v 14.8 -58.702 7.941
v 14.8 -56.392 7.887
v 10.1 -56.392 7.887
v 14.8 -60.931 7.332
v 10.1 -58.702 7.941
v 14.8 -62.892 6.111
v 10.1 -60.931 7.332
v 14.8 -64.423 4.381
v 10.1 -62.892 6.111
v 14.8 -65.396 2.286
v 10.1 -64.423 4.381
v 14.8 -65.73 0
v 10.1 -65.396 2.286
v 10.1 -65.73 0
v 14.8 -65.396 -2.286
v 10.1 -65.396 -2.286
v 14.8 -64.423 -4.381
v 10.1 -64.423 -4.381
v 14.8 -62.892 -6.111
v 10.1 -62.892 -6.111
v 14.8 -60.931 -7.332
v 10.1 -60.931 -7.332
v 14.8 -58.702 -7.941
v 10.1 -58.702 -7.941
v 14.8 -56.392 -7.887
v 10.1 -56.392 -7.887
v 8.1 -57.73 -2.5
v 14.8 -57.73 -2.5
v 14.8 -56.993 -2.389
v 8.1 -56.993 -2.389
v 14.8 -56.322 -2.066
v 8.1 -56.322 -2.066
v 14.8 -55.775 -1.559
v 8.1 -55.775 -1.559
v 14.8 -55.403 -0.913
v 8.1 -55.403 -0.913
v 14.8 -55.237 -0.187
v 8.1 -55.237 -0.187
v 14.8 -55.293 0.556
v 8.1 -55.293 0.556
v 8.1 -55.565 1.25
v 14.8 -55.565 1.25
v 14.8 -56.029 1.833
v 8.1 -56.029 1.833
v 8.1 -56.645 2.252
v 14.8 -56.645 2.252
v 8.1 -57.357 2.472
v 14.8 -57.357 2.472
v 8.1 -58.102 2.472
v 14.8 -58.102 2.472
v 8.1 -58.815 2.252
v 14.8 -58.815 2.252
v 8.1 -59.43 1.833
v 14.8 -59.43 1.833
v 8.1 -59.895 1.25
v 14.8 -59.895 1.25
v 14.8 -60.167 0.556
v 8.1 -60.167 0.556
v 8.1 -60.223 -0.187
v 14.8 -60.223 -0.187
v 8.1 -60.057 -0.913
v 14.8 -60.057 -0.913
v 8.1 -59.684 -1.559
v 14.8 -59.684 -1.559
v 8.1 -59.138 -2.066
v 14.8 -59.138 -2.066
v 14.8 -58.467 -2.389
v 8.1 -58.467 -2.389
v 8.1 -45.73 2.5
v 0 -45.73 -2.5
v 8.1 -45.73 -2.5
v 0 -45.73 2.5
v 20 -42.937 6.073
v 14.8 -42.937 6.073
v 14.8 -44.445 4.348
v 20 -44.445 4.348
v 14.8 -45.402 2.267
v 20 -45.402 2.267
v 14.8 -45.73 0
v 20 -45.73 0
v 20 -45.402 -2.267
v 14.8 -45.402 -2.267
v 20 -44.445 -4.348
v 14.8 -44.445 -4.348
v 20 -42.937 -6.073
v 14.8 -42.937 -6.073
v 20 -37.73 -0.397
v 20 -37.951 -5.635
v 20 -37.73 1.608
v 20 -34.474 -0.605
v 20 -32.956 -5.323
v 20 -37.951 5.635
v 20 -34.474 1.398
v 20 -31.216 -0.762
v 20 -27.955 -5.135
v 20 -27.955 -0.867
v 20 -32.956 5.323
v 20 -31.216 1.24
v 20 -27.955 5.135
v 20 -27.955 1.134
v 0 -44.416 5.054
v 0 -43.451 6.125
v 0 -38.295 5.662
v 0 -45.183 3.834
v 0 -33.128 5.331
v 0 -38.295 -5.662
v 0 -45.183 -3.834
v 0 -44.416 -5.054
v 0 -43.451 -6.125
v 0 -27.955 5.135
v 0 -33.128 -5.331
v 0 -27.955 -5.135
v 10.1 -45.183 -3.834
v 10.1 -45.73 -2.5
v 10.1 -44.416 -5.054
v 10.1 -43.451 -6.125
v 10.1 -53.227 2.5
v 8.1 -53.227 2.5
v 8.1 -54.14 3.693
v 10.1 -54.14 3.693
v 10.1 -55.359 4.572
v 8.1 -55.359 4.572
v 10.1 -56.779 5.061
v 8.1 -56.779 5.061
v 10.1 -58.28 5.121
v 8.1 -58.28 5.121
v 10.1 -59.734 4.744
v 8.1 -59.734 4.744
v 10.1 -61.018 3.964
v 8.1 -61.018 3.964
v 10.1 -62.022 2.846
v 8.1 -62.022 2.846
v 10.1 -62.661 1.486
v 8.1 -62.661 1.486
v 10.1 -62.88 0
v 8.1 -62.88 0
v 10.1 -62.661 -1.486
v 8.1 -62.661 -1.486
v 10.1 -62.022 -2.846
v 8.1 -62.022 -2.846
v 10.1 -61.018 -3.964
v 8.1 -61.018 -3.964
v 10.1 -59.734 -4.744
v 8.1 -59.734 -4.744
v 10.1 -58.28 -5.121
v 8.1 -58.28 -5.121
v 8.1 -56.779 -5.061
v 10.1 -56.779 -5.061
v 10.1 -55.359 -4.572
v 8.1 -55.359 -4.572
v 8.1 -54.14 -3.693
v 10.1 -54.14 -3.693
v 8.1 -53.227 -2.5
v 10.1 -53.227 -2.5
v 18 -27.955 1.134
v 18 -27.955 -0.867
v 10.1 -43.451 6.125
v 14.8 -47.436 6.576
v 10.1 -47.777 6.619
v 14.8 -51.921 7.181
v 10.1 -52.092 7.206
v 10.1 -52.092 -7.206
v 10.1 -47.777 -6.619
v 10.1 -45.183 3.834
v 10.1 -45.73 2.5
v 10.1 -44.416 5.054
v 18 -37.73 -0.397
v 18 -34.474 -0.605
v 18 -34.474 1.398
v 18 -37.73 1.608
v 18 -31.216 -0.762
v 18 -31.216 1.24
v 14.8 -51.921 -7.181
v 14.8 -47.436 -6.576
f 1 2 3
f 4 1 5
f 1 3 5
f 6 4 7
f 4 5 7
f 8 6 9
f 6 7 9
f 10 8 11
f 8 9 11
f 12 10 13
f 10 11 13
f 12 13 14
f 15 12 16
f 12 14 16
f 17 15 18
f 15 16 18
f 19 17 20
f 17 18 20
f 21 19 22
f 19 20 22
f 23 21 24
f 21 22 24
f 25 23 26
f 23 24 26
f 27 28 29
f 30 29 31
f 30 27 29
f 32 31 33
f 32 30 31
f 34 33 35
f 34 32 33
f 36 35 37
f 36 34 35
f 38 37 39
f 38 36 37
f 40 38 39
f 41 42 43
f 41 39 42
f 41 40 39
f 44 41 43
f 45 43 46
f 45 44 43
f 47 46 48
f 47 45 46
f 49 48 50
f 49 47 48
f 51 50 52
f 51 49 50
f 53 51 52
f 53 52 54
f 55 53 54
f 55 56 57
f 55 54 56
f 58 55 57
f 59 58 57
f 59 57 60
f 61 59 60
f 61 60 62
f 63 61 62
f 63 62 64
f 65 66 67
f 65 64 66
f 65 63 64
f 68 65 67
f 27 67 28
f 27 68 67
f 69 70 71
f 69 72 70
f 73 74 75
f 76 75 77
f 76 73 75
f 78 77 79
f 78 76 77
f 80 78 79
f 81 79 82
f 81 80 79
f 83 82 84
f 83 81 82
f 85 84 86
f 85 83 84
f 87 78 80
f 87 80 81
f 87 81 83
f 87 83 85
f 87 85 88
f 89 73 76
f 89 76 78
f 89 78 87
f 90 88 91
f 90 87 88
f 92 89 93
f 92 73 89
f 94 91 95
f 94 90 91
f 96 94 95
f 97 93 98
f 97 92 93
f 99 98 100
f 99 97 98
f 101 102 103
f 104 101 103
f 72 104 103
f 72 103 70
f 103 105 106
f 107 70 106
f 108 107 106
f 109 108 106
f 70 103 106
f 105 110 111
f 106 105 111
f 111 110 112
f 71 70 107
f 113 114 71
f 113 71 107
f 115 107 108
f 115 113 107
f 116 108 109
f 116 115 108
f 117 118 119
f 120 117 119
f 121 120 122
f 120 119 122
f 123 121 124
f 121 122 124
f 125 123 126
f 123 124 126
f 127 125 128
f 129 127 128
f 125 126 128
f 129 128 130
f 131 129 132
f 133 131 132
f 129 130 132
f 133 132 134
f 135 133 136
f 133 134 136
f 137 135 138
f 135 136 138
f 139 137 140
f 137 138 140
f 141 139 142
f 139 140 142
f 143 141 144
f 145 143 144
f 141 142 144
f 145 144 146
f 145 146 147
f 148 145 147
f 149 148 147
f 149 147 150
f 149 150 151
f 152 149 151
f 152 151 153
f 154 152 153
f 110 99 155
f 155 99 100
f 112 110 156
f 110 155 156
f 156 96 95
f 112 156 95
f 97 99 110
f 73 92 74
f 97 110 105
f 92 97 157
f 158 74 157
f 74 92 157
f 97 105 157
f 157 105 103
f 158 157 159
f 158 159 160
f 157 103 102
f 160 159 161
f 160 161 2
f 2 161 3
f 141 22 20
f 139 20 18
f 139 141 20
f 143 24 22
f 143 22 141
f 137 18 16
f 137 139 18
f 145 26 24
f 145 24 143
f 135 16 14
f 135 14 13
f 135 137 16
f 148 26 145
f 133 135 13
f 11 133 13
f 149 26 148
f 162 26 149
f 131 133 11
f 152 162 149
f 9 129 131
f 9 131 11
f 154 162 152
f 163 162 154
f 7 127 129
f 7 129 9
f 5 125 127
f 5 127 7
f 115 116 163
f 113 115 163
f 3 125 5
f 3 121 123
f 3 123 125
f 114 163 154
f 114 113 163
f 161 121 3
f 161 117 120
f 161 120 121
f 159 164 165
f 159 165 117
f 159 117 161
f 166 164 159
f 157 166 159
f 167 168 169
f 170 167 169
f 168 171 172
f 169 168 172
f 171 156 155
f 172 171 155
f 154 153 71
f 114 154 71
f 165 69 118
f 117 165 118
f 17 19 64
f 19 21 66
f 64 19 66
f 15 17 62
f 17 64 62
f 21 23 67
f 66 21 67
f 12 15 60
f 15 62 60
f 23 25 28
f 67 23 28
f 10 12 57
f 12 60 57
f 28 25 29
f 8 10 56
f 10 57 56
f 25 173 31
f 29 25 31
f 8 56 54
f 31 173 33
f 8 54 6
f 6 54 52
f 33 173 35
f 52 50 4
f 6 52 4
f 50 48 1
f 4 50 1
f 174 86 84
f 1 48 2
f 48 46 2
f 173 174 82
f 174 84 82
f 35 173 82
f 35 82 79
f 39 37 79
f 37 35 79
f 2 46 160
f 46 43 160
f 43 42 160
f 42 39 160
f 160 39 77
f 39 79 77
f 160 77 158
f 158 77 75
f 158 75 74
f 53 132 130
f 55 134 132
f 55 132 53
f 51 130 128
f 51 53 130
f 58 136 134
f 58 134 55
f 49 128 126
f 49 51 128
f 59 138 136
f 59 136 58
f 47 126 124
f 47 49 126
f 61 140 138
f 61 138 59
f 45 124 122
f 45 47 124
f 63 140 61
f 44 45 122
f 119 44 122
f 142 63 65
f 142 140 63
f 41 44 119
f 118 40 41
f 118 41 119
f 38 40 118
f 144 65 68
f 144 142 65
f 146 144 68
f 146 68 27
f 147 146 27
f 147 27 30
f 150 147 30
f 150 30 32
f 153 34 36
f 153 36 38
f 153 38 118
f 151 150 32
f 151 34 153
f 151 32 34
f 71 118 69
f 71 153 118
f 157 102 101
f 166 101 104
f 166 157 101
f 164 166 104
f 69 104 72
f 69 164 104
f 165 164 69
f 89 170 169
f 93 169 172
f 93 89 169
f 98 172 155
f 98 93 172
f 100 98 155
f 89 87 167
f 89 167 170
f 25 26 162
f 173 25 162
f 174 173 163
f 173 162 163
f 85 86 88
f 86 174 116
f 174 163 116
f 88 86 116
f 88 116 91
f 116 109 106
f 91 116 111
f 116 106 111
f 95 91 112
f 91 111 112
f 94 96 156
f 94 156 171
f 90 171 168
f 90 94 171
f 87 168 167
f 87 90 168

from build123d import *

# Parameters (mm, degrees)
SKETCH1_R                = 1.5
SKETCH1_R_2              = 2.5
BOSS_EXTRUDE1_DEPTH      = 20
SKETCH2_W                = 8.1
SKETCH2_H                = 20
SKETCH2_W_2              = 5.2
SKETCH2_W_3              = 5.1
CUT_EXTRUDE1_DEPTH       = 20
CUT_EXTRUDE1_DEPTH_BACK  = 20
CUT_EXTRUDE2_DEPTH       = 9
BOSS_EXTRUDE2_DEPTH      = 11.9
SKETCH5_R                = 3
BOSS_EXTRUDE3_DEPTH      = 5
CUT_EXTRUDE6_DEPTH       = 1
SKETCH13_R               = 2.5
CUT_EXTRUDE7_DEPTH       = 4
BOSS_EXTRUDE4_DEPTH      = 3
CUT_EXTRUDE9_DEPTH       = 3
SKETCH17_W               = 9
SKETCH17_H               = 3.569322199
CUT_EXTRUDE11_DEPTH      = 3
SKETCH18_W               = 5.770974844
SKETCH18_H               = 0.772936936
BOSS_EXTRUDE5_DEPTH      = 6.9
BOSS_EXTRUDE5_DEPTH_BACK = 1
SKETCH19_W               = 5.1
SKETCH19_H               = 16.397725614
CUT_EXTRUDE12_DEPTH      = 0.301495
SKETCH20_W               = 5
SKETCH20_H               = 12.419235667
CUT_EXTRUDE13_DEPTH      = 10
BOSS_EXTRUDE6_DEPTH      = 2
SKETCH23_W               = 4.9
SKETCH23_H               = 6
BOSS_EXTRUDE7_DEPTH      = 4
SKETCH22_R               = 1
CUT_EXTRUDE15_DEPTH      = 8
BOSS_EXTRUDE8_DEPTH      = 2
SKETCH14_R               = 1.5
CUT_EXTRUDE8_DEPTH       = 10.1
CUT_EXTRUDE17_DEPTH      = 8.1
CUT_EXTRUDE17_DEPTH_BACK = 2
CUT_EXTRUDE18_DEPTH      = 2
CUT_EXTRUDE20_DEPTH      = 5.2
SKETCH30_W               = 6.9
SKETCH30_H               = 20
CUT_EXTRUDE21_DEPTH      = 0.283797
CUT_EXTRUDE22_REACH      = 91.699
SKETCH31_W               = 2
SKETCH31_H               = 11.022421386
CUT_EXTRUDE23_DEPTH      = 7
CUT_EXTRUDE24_DEPTH      = 21
SKETCH34_W               = 70.65252795
SKETCH34_H               = 74.33474439
CUT_EXTRUDE25_DEPTH      = 21


with BuildPart() as part:
    # Sketch1 → Boss-Extrude1 (new body)
    with BuildSketch(Plane(origin=(0, 0, 0), x_dir=(0, 0, -1), z_dir=(1, 0, 0))):
        with BuildLine():
            ThreePointArc((9.765353557, 20.116545894), (0, 32.270117322), (-9.765353557, 20.116545894))
            ThreePointArc((-9.765353557, 20.116545894), (-5.132645827, -18.047253777), (-7.88740095, -56.392382678))
            ThreePointArc((-7.88740095, -56.392382678), (0, -65.729882678), (7.88740095, -56.392382678))
            ThreePointArc((7.88740095, -56.392382678), (5.132645827, -18.047253777), (9.765353557, 20.116545894))
        make_face()
        with Locations((0, 22.270117322)):
            Circle(SKETCH1_R, mode=Mode.SUBTRACT)
        with Locations((0, -57.729882678)):
            Circle(SKETCH1_R_2, mode=Mode.SUBTRACT)
    extrude(amount=BOSS_EXTRUDE1_DEPTH)

    # Sketch2 → Cut-Extrude1 (cut, two sides)
    with BuildSketch(Plane.XY) as cut_extrude1_sk:
        with Locations((4.05, -55.729882678)):
            Rectangle(SKETCH2_W, SKETCH2_H)
        with Locations((17.4, -55.729882678)):
            Rectangle(SKETCH2_W_2, SKETCH2_H)
        with Locations((5.55, 22.270117322)):
            Rectangle(SKETCH2_W_3, SKETCH2_H)
    extrude(amount=CUT_EXTRUDE1_DEPTH, mode=Mode.SUBTRACT)
    extrude(cut_extrude1_sk.sketch, amount=-CUT_EXTRUDE1_DEPTH_BACK, mode=Mode.SUBTRACT)

    # Sketch3 → Cut-Extrude2 (cut)
    with BuildSketch(Plane.ZY.offset(-8.1)):
        with BuildLine():
            Line((8.5, 22.270117322), (8.5, 40.909533312))
            Line((8.5, 40.909533312), (-17.52872033, 40.909533312))
            Line((-17.52872033, 40.909533312), (-17.52872033, 13.770117322))
            Line((-17.52872033, 13.770117322), (0, 13.770117322))
            ThreePointArc((0, 13.770117322), (6.01040764, 16.259709682), (8.5, 22.270117322))
        make_face()
    extrude(amount=-CUT_EXTRUDE2_DEPTH, mode=Mode.SUBTRACT)

    # Sketch4 → Boss-Extrude2 (add, through all)
    with BuildSketch(Plane.ZY.offset(-8.1)):
        Polygon((8.5, 27.537944199), (8.283796844, 12.741558936), (10.283796844, 12.741558936), (10.283796844, 27.537944199), align=None)
    extrude(amount=-BOSS_EXTRUDE2_DEPTH)

    # Sketch5 → Boss-Extrude3 (add)
    with BuildSketch(Plane.ZY.offset(-8.1)):
        with BuildLine():
            Line((8.145156861, 11.968622), (8.447845456, 23.968622))
            Line((8.447845456, 23.968622), (9.854698466, 23.968622))
            Line((9.854698466, 23.968622), (15.022421386, 23.968622))
            ThreePointArc((15.022421386, 23.968622), (21.022421386, 17.968622), (15.022421386, 11.968622))
            Line((15.022421386, 11.968622), (8.145156861, 11.968622))
        make_face()
        with Locations((15.022421386, 17.968622)):
            Circle(SKETCH5_R, mode=Mode.SUBTRACT)
    extrude(amount=-BOSS_EXTRUDE3_DEPTH)

    # Sketch12 → Cut-Extrude6 (cut)
    with BuildSketch(Plane(origin=(13.1, 0, 0), x_dir=(0, 0, -1), z_dir=(1, 0, 0))):
        Polygon((-13.902900694, 14.968622), (-13.902900694, 12.968622), (-15.902900694, 12.968622), (-15.902900694, 14.968622), (-15.902900694, 15.294296094), (-13.902900694, 15.294296094), align=None)
    extrude(amount=-CUT_EXTRUDE6_DEPTH, mode=Mode.SUBTRACT)

    # Sketch13 → Cut-Extrude7 (cut)
    with BuildSketch(Plane.ZY.offset(-17.1)):
        with Locations((0, 22.270117322)):
            Circle(SKETCH13_R)
    extrude(amount=-CUT_EXTRUDE7_DEPTH, mode=Mode.SUBTRACT)

    # Sketch15 → Boss-Extrude4 (add)
    with BuildSketch(Plane.ZY):
        Polygon((10, 22.270117322), (10, 11.968622), (8.145156861, 11.968622), (7.595672539, 11.968622), align=None)
    extrude(amount=-BOSS_EXTRUDE4_DEPTH)

    # Sketch16 → Cut-Extrude9 (cut)
    with BuildSketch(Plane(origin=(20, 0, 0), x_dir=(0, 0, -1), z_dir=(1, 0, 0))):
        with BuildLine():
            Line((-10.283796844, 23.968622), (-9.854698466, 23.968622))
            ThreePointArc((-9.854698466, 23.968622), (-9.349264901, 25.818531871), (-8.5, 27.537944199))
            Line((-8.5, 27.537944199), (-10.283796844, 27.537944199))
            Line((-10.283796844, 27.537944199), (-10.283796844, 23.968622))
        make_face()
    extrude(amount=-CUT_EXTRUDE9_DEPTH, mode=Mode.SUBTRACT)

    # Sketch17 → Cut-Extrude11 (cut)
    with BuildSketch(Plane.XY.offset(10.283796844)):
        with Locations((12.6, 25.7532831)):
            Rectangle(SKETCH17_W, SKETCH17_H)
    extrude(amount=-CUT_EXTRUDE11_DEPTH, mode=Mode.SUBTRACT)

    # Sketch18 → Boss-Extrude5 (add, two sides)
    with BuildSketch(Plane(origin=(13.1, 0, 0), x_dir=(0, 0, -1), z_dir=(1, 0, 0))) as boss_extrude5_sk:
        with Locations((-7.398309422, 12.355090468)):
            Rectangle(SKETCH18_W, SKETCH18_H)
    extrude(amount=BOSS_EXTRUDE5_DEPTH)
    extrude(boss_extrude5_sk.sketch, amount=-BOSS_EXTRUDE5_DEPTH_BACK)

    # Sketch19 → Cut-Extrude12 (cut)
    with BuildSketch(Plane(origin=(0, 12.270117322, 0), x_dir=(1, 0, 0), z_dir=(0, 1, 0))):
        with Locations((5.55, 0)):
            Rectangle(SKETCH19_W, SKETCH19_H)
    extrude(amount=-CUT_EXTRUDE12_DEPTH, mode=Mode.SUBTRACT)

    # Sketch20 → Cut-Extrude13 (cut)
    with BuildSketch(Plane.ZY.offset(-17.1)):
        with Locations((0, 28.479735156)):
            Rectangle(SKETCH20_W, SKETCH20_H)
    extrude(amount=-CUT_EXTRUDE13_DEPTH, mode=Mode.SUBTRACT)

    # Sketch21 → Boss-Extrude6 (add)
    with BuildSketch(Plane.ZY.offset(-17.1)):
        with BuildLine():
            Line((-8.473151119, 13.770117322), (0.278481736, 12.273995678))
            ThreePointArc((0.278481736, 12.273995678), (9.936881703, 21.148341047), (2.5, 31.952575688))
            Line((2.5, 31.952575688), (2.5, 22.270117322))
            ThreePointArc((2.5, 22.270117322), (0, 19.770117322), (-2.5, 22.270117322))
            Line((-2.5, 22.270117322), (-2.5, 31.952575688))
            ThreePointArc((-2.5, 31.952575688), (-8.522477621, 27.501501002), (-9.765353557, 20.116545894))
            ThreePointArc((-9.765353557, 20.116545894), (-9.093560923, 16.948562662), (-8.473151119, 13.770117322))
        make_face()
    extrude(amount=BOSS_EXTRUDE6_DEPTH)

    # Sketch23 → Boss-Extrude7 (add)
    with BuildSketch(Plane.XY.offset(10.283796844)):
        with Locations((17.55, 26.968622)):
            Rectangle(SKETCH23_W, SKETCH23_H)
    extrude(amount=-BOSS_EXTRUDE7_DEPTH)

    # Sketch22 → Cut-Extrude15 (cut)
    with BuildSketch(Plane.XY.offset(10.283796844)):
        with Locations((17.55, 26.870117322)):
            Circle(SKETCH22_R)
    extrude(amount=-CUT_EXTRUDE15_DEPTH, mode=Mode.SUBTRACT)

    # Sketch24 → Boss-Extrude8 (add)
    with BuildSketch(Plane.ZY.offset(-8.1)):
        with BuildLine():
            Line((5.147845456, 19.737443909), (5.147845456, 15.506265819))
            Line((5.147845456, 15.506265819), (8.447845456, 15.506265819))
            Line((8.447845456, 15.506265819), (8.447845456, 23.968622))
            add(Edge.make_bspline(
                [(8.447845456, 23.968622), (5.147845456, 23.968622), (5.147845456, 19.737443909)],
                knots=[3.141592654, 3.141592654, 3.141592654, 4.71238898, 4.71238898, 4.71238898], degree=2, weights=[1, 0.707106781, 1]))
        make_face()
    extrude(amount=-BOSS_EXTRUDE8_DEPTH)

    # Sketch14 → Cut-Extrude8 (cut)
    with BuildSketch(Plane.ZY):
        with Locations((7.532575614, 18.331804915)):
            Circle(SKETCH14_R)
    extrude(amount=-CUT_EXTRUDE8_DEPTH, mode=Mode.SUBTRACT)

    # Sketch25 → Cut-Extrude17 (cut, two sides)
    with BuildSketch(Plane.ZY.offset(-8.1)) as cut_extrude17_sk:
        with BuildLine():
            Line((12, -45.729882678), (8.346153846, -36.960651908))
            ThreePointArc((8.346153846, -36.960651908), (6.973852263, -42.37911752), (2.5, -45.729882678))
            Line((2.5, -45.729882678), (2.5, -53.227383372))
            ThreePointArc((2.5, -53.227383372), (0, -62.879882678), (-2.5, -53.227383372))
            Line((-2.5, -53.227383372), (-2.5, -45.729882678))
            ThreePointArc((-2.5, -45.729882678), (-6.973852263, -42.37911752), (-8.346153846, -36.960651908))
            Line((-8.346153846, -36.960651908), (-12, -45.729882678))
            Line((-12, -45.729882678), (-12, -57.729882678))
            ThreePointArc((-12, -57.729882678), (0, -69.729882678), (12, -57.729882678))
            Line((12, -57.729882678), (12, -45.729882678))
        make_face()
    extrude(amount=CUT_EXTRUDE17_DEPTH, mode=Mode.SUBTRACT)
    extrude(cut_extrude17_sk.sketch, amount=-CUT_EXTRUDE17_DEPTH_BACK, mode=Mode.SUBTRACT)

    # Sketch26 → Cut-Extrude18 (cut)
    with BuildSketch(Plane(origin=(20, 0, 0), x_dir=(0, 0, -1), z_dir=(1, 0, 0))):
        with BuildLine():
            Line((-7.209968303, 15.085404497), (-10.283796844, 15.085404497))
            Line((-10.283796844, 15.085404497), (-10.283796844, 17.085404497))
            Line((-10.283796844, 17.085404497), (-7.209968303, 17.085404497))
            ThreePointArc((-7.209968303, 17.085404497), (-4.010444351, 15.949526558), (-2.243391617, 13.050441039))
            ThreePointArc((-2.243391617, 13.050441039), (0.649659998, -12.257973546), (0.397031114, -37.729953741))
            Line((0.397031114, -37.729953741), (-1.608183929, -37.729953741))
            ThreePointArc((-1.608183929, -37.729953741), (-1.343036313, -12.450773719), (-4.206611504, 12.667092093))
            ThreePointArc((-4.206611504, 12.667092093), (-5.281990934, 14.405678614), (-7.209968303, 15.085404497))
        make_face()
    extrude(amount=-CUT_EXTRUDE18_DEPTH, mode=Mode.SUBTRACT)

    # Sketch29 → Cut-Extrude20 (cut)
    with BuildSketch(Plane(origin=(20, 0, 0), x_dir=(0, 0, -1), z_dir=(1, 0, 0))):
        with BuildLine():
            Line((8, -37.729882678), (8.140336581, -37.729882678))
            Line((8.140336581, -37.729882678), (8.140336581, -45.937498976))
            Line((8.140336581, -45.937498976), (-15.754893946, -45.937498976))
            Line((-15.754893946, -45.937498976), (-15.754893946, -37.729882678))
            Line((-15.754893946, -37.729882678), (-8, -37.729882678))
            ThreePointArc((-8, -37.729882678), (0, -45.729882678), (8, -37.729882678))
        make_face()
    extrude(amount=-CUT_EXTRUDE20_DEPTH, mode=Mode.SUBTRACT)

    # Sketch30 → Cut-Extrude21 (cut)
    with BuildSketch(Plane.XY.offset(10.283796844)):
        with Locations((16.55, 21.968622)):
            Rectangle(SKETCH30_W, SKETCH30_H)
    extrude(amount=-CUT_EXTRUDE21_DEPTH, mode=Mode.SUBTRACT)

    # Sketch31 → Cut-Extrude22 (cut, up to next)
    with BuildSketch(Plane(origin=(0, 23.968622, 0), x_dir=(1, 0, 0), z_dir=(0, 1, 0)), mode=Mode.PRIVATE) as cut_extrude22_sk1:
        with Locations((9.1, -15.511210693)):
            Rectangle(SKETCH31_W, SKETCH31_H)
    cut_extrude22_tool1 = extrude(cut_extrude22_sk1.sketch, amount=-CUT_EXTRUDE22_REACH, mode=Mode.PRIVATE) & part.part
    add(cut_extrude22_tool1.solids().sort_by_distance((9.1, 23.968622, 15.511211))[0], mode=Mode.SUBTRACT)

    # Sketch32 → Cut-Extrude23 (cut)
    with BuildSketch(Plane.ZY.offset(-8.1)):
        Polygon((-8.473151119, 13.770117322), (-8.473151119, 5.401068454), (5.147845456, 15.506265819), align=None)
    extrude(amount=-CUT_EXTRUDE23_DEPTH, mode=Mode.SUBTRACT)

    # Sketch33 → Cut-Extrude24 (cut, through all)
    with BuildSketch(Plane(origin=(20, 0, 0), x_dir=(0, 0, -1), z_dir=(1, 0, 0))):
        Polygon((-9.30475326, -22.954882678), (-9.30475326, -27.954882678), (8.892389241, -27.954882678), (8.892389241, -22.954882678), (8.892389241, -17.954882678), (-9.30475326, -17.954882678), align=None)
    extrude(amount=-CUT_EXTRUDE24_DEPTH, mode=Mode.SUBTRACT)

    # Sketch34 → Cut-Extrude25 (cut, through all)
    with BuildSketch(Plane(origin=(20, 0, 0), x_dir=(0, 0, -1), z_dir=(1, 0, 0))):
        with Locations((-4.594652679, 17.444902541)):
            Rectangle(SKETCH34_W, SKETCH34_H)
    extrude(amount=-CUT_EXTRUDE25_DEPTH, mode=Mode.SUBTRACT)


solid = part.part
